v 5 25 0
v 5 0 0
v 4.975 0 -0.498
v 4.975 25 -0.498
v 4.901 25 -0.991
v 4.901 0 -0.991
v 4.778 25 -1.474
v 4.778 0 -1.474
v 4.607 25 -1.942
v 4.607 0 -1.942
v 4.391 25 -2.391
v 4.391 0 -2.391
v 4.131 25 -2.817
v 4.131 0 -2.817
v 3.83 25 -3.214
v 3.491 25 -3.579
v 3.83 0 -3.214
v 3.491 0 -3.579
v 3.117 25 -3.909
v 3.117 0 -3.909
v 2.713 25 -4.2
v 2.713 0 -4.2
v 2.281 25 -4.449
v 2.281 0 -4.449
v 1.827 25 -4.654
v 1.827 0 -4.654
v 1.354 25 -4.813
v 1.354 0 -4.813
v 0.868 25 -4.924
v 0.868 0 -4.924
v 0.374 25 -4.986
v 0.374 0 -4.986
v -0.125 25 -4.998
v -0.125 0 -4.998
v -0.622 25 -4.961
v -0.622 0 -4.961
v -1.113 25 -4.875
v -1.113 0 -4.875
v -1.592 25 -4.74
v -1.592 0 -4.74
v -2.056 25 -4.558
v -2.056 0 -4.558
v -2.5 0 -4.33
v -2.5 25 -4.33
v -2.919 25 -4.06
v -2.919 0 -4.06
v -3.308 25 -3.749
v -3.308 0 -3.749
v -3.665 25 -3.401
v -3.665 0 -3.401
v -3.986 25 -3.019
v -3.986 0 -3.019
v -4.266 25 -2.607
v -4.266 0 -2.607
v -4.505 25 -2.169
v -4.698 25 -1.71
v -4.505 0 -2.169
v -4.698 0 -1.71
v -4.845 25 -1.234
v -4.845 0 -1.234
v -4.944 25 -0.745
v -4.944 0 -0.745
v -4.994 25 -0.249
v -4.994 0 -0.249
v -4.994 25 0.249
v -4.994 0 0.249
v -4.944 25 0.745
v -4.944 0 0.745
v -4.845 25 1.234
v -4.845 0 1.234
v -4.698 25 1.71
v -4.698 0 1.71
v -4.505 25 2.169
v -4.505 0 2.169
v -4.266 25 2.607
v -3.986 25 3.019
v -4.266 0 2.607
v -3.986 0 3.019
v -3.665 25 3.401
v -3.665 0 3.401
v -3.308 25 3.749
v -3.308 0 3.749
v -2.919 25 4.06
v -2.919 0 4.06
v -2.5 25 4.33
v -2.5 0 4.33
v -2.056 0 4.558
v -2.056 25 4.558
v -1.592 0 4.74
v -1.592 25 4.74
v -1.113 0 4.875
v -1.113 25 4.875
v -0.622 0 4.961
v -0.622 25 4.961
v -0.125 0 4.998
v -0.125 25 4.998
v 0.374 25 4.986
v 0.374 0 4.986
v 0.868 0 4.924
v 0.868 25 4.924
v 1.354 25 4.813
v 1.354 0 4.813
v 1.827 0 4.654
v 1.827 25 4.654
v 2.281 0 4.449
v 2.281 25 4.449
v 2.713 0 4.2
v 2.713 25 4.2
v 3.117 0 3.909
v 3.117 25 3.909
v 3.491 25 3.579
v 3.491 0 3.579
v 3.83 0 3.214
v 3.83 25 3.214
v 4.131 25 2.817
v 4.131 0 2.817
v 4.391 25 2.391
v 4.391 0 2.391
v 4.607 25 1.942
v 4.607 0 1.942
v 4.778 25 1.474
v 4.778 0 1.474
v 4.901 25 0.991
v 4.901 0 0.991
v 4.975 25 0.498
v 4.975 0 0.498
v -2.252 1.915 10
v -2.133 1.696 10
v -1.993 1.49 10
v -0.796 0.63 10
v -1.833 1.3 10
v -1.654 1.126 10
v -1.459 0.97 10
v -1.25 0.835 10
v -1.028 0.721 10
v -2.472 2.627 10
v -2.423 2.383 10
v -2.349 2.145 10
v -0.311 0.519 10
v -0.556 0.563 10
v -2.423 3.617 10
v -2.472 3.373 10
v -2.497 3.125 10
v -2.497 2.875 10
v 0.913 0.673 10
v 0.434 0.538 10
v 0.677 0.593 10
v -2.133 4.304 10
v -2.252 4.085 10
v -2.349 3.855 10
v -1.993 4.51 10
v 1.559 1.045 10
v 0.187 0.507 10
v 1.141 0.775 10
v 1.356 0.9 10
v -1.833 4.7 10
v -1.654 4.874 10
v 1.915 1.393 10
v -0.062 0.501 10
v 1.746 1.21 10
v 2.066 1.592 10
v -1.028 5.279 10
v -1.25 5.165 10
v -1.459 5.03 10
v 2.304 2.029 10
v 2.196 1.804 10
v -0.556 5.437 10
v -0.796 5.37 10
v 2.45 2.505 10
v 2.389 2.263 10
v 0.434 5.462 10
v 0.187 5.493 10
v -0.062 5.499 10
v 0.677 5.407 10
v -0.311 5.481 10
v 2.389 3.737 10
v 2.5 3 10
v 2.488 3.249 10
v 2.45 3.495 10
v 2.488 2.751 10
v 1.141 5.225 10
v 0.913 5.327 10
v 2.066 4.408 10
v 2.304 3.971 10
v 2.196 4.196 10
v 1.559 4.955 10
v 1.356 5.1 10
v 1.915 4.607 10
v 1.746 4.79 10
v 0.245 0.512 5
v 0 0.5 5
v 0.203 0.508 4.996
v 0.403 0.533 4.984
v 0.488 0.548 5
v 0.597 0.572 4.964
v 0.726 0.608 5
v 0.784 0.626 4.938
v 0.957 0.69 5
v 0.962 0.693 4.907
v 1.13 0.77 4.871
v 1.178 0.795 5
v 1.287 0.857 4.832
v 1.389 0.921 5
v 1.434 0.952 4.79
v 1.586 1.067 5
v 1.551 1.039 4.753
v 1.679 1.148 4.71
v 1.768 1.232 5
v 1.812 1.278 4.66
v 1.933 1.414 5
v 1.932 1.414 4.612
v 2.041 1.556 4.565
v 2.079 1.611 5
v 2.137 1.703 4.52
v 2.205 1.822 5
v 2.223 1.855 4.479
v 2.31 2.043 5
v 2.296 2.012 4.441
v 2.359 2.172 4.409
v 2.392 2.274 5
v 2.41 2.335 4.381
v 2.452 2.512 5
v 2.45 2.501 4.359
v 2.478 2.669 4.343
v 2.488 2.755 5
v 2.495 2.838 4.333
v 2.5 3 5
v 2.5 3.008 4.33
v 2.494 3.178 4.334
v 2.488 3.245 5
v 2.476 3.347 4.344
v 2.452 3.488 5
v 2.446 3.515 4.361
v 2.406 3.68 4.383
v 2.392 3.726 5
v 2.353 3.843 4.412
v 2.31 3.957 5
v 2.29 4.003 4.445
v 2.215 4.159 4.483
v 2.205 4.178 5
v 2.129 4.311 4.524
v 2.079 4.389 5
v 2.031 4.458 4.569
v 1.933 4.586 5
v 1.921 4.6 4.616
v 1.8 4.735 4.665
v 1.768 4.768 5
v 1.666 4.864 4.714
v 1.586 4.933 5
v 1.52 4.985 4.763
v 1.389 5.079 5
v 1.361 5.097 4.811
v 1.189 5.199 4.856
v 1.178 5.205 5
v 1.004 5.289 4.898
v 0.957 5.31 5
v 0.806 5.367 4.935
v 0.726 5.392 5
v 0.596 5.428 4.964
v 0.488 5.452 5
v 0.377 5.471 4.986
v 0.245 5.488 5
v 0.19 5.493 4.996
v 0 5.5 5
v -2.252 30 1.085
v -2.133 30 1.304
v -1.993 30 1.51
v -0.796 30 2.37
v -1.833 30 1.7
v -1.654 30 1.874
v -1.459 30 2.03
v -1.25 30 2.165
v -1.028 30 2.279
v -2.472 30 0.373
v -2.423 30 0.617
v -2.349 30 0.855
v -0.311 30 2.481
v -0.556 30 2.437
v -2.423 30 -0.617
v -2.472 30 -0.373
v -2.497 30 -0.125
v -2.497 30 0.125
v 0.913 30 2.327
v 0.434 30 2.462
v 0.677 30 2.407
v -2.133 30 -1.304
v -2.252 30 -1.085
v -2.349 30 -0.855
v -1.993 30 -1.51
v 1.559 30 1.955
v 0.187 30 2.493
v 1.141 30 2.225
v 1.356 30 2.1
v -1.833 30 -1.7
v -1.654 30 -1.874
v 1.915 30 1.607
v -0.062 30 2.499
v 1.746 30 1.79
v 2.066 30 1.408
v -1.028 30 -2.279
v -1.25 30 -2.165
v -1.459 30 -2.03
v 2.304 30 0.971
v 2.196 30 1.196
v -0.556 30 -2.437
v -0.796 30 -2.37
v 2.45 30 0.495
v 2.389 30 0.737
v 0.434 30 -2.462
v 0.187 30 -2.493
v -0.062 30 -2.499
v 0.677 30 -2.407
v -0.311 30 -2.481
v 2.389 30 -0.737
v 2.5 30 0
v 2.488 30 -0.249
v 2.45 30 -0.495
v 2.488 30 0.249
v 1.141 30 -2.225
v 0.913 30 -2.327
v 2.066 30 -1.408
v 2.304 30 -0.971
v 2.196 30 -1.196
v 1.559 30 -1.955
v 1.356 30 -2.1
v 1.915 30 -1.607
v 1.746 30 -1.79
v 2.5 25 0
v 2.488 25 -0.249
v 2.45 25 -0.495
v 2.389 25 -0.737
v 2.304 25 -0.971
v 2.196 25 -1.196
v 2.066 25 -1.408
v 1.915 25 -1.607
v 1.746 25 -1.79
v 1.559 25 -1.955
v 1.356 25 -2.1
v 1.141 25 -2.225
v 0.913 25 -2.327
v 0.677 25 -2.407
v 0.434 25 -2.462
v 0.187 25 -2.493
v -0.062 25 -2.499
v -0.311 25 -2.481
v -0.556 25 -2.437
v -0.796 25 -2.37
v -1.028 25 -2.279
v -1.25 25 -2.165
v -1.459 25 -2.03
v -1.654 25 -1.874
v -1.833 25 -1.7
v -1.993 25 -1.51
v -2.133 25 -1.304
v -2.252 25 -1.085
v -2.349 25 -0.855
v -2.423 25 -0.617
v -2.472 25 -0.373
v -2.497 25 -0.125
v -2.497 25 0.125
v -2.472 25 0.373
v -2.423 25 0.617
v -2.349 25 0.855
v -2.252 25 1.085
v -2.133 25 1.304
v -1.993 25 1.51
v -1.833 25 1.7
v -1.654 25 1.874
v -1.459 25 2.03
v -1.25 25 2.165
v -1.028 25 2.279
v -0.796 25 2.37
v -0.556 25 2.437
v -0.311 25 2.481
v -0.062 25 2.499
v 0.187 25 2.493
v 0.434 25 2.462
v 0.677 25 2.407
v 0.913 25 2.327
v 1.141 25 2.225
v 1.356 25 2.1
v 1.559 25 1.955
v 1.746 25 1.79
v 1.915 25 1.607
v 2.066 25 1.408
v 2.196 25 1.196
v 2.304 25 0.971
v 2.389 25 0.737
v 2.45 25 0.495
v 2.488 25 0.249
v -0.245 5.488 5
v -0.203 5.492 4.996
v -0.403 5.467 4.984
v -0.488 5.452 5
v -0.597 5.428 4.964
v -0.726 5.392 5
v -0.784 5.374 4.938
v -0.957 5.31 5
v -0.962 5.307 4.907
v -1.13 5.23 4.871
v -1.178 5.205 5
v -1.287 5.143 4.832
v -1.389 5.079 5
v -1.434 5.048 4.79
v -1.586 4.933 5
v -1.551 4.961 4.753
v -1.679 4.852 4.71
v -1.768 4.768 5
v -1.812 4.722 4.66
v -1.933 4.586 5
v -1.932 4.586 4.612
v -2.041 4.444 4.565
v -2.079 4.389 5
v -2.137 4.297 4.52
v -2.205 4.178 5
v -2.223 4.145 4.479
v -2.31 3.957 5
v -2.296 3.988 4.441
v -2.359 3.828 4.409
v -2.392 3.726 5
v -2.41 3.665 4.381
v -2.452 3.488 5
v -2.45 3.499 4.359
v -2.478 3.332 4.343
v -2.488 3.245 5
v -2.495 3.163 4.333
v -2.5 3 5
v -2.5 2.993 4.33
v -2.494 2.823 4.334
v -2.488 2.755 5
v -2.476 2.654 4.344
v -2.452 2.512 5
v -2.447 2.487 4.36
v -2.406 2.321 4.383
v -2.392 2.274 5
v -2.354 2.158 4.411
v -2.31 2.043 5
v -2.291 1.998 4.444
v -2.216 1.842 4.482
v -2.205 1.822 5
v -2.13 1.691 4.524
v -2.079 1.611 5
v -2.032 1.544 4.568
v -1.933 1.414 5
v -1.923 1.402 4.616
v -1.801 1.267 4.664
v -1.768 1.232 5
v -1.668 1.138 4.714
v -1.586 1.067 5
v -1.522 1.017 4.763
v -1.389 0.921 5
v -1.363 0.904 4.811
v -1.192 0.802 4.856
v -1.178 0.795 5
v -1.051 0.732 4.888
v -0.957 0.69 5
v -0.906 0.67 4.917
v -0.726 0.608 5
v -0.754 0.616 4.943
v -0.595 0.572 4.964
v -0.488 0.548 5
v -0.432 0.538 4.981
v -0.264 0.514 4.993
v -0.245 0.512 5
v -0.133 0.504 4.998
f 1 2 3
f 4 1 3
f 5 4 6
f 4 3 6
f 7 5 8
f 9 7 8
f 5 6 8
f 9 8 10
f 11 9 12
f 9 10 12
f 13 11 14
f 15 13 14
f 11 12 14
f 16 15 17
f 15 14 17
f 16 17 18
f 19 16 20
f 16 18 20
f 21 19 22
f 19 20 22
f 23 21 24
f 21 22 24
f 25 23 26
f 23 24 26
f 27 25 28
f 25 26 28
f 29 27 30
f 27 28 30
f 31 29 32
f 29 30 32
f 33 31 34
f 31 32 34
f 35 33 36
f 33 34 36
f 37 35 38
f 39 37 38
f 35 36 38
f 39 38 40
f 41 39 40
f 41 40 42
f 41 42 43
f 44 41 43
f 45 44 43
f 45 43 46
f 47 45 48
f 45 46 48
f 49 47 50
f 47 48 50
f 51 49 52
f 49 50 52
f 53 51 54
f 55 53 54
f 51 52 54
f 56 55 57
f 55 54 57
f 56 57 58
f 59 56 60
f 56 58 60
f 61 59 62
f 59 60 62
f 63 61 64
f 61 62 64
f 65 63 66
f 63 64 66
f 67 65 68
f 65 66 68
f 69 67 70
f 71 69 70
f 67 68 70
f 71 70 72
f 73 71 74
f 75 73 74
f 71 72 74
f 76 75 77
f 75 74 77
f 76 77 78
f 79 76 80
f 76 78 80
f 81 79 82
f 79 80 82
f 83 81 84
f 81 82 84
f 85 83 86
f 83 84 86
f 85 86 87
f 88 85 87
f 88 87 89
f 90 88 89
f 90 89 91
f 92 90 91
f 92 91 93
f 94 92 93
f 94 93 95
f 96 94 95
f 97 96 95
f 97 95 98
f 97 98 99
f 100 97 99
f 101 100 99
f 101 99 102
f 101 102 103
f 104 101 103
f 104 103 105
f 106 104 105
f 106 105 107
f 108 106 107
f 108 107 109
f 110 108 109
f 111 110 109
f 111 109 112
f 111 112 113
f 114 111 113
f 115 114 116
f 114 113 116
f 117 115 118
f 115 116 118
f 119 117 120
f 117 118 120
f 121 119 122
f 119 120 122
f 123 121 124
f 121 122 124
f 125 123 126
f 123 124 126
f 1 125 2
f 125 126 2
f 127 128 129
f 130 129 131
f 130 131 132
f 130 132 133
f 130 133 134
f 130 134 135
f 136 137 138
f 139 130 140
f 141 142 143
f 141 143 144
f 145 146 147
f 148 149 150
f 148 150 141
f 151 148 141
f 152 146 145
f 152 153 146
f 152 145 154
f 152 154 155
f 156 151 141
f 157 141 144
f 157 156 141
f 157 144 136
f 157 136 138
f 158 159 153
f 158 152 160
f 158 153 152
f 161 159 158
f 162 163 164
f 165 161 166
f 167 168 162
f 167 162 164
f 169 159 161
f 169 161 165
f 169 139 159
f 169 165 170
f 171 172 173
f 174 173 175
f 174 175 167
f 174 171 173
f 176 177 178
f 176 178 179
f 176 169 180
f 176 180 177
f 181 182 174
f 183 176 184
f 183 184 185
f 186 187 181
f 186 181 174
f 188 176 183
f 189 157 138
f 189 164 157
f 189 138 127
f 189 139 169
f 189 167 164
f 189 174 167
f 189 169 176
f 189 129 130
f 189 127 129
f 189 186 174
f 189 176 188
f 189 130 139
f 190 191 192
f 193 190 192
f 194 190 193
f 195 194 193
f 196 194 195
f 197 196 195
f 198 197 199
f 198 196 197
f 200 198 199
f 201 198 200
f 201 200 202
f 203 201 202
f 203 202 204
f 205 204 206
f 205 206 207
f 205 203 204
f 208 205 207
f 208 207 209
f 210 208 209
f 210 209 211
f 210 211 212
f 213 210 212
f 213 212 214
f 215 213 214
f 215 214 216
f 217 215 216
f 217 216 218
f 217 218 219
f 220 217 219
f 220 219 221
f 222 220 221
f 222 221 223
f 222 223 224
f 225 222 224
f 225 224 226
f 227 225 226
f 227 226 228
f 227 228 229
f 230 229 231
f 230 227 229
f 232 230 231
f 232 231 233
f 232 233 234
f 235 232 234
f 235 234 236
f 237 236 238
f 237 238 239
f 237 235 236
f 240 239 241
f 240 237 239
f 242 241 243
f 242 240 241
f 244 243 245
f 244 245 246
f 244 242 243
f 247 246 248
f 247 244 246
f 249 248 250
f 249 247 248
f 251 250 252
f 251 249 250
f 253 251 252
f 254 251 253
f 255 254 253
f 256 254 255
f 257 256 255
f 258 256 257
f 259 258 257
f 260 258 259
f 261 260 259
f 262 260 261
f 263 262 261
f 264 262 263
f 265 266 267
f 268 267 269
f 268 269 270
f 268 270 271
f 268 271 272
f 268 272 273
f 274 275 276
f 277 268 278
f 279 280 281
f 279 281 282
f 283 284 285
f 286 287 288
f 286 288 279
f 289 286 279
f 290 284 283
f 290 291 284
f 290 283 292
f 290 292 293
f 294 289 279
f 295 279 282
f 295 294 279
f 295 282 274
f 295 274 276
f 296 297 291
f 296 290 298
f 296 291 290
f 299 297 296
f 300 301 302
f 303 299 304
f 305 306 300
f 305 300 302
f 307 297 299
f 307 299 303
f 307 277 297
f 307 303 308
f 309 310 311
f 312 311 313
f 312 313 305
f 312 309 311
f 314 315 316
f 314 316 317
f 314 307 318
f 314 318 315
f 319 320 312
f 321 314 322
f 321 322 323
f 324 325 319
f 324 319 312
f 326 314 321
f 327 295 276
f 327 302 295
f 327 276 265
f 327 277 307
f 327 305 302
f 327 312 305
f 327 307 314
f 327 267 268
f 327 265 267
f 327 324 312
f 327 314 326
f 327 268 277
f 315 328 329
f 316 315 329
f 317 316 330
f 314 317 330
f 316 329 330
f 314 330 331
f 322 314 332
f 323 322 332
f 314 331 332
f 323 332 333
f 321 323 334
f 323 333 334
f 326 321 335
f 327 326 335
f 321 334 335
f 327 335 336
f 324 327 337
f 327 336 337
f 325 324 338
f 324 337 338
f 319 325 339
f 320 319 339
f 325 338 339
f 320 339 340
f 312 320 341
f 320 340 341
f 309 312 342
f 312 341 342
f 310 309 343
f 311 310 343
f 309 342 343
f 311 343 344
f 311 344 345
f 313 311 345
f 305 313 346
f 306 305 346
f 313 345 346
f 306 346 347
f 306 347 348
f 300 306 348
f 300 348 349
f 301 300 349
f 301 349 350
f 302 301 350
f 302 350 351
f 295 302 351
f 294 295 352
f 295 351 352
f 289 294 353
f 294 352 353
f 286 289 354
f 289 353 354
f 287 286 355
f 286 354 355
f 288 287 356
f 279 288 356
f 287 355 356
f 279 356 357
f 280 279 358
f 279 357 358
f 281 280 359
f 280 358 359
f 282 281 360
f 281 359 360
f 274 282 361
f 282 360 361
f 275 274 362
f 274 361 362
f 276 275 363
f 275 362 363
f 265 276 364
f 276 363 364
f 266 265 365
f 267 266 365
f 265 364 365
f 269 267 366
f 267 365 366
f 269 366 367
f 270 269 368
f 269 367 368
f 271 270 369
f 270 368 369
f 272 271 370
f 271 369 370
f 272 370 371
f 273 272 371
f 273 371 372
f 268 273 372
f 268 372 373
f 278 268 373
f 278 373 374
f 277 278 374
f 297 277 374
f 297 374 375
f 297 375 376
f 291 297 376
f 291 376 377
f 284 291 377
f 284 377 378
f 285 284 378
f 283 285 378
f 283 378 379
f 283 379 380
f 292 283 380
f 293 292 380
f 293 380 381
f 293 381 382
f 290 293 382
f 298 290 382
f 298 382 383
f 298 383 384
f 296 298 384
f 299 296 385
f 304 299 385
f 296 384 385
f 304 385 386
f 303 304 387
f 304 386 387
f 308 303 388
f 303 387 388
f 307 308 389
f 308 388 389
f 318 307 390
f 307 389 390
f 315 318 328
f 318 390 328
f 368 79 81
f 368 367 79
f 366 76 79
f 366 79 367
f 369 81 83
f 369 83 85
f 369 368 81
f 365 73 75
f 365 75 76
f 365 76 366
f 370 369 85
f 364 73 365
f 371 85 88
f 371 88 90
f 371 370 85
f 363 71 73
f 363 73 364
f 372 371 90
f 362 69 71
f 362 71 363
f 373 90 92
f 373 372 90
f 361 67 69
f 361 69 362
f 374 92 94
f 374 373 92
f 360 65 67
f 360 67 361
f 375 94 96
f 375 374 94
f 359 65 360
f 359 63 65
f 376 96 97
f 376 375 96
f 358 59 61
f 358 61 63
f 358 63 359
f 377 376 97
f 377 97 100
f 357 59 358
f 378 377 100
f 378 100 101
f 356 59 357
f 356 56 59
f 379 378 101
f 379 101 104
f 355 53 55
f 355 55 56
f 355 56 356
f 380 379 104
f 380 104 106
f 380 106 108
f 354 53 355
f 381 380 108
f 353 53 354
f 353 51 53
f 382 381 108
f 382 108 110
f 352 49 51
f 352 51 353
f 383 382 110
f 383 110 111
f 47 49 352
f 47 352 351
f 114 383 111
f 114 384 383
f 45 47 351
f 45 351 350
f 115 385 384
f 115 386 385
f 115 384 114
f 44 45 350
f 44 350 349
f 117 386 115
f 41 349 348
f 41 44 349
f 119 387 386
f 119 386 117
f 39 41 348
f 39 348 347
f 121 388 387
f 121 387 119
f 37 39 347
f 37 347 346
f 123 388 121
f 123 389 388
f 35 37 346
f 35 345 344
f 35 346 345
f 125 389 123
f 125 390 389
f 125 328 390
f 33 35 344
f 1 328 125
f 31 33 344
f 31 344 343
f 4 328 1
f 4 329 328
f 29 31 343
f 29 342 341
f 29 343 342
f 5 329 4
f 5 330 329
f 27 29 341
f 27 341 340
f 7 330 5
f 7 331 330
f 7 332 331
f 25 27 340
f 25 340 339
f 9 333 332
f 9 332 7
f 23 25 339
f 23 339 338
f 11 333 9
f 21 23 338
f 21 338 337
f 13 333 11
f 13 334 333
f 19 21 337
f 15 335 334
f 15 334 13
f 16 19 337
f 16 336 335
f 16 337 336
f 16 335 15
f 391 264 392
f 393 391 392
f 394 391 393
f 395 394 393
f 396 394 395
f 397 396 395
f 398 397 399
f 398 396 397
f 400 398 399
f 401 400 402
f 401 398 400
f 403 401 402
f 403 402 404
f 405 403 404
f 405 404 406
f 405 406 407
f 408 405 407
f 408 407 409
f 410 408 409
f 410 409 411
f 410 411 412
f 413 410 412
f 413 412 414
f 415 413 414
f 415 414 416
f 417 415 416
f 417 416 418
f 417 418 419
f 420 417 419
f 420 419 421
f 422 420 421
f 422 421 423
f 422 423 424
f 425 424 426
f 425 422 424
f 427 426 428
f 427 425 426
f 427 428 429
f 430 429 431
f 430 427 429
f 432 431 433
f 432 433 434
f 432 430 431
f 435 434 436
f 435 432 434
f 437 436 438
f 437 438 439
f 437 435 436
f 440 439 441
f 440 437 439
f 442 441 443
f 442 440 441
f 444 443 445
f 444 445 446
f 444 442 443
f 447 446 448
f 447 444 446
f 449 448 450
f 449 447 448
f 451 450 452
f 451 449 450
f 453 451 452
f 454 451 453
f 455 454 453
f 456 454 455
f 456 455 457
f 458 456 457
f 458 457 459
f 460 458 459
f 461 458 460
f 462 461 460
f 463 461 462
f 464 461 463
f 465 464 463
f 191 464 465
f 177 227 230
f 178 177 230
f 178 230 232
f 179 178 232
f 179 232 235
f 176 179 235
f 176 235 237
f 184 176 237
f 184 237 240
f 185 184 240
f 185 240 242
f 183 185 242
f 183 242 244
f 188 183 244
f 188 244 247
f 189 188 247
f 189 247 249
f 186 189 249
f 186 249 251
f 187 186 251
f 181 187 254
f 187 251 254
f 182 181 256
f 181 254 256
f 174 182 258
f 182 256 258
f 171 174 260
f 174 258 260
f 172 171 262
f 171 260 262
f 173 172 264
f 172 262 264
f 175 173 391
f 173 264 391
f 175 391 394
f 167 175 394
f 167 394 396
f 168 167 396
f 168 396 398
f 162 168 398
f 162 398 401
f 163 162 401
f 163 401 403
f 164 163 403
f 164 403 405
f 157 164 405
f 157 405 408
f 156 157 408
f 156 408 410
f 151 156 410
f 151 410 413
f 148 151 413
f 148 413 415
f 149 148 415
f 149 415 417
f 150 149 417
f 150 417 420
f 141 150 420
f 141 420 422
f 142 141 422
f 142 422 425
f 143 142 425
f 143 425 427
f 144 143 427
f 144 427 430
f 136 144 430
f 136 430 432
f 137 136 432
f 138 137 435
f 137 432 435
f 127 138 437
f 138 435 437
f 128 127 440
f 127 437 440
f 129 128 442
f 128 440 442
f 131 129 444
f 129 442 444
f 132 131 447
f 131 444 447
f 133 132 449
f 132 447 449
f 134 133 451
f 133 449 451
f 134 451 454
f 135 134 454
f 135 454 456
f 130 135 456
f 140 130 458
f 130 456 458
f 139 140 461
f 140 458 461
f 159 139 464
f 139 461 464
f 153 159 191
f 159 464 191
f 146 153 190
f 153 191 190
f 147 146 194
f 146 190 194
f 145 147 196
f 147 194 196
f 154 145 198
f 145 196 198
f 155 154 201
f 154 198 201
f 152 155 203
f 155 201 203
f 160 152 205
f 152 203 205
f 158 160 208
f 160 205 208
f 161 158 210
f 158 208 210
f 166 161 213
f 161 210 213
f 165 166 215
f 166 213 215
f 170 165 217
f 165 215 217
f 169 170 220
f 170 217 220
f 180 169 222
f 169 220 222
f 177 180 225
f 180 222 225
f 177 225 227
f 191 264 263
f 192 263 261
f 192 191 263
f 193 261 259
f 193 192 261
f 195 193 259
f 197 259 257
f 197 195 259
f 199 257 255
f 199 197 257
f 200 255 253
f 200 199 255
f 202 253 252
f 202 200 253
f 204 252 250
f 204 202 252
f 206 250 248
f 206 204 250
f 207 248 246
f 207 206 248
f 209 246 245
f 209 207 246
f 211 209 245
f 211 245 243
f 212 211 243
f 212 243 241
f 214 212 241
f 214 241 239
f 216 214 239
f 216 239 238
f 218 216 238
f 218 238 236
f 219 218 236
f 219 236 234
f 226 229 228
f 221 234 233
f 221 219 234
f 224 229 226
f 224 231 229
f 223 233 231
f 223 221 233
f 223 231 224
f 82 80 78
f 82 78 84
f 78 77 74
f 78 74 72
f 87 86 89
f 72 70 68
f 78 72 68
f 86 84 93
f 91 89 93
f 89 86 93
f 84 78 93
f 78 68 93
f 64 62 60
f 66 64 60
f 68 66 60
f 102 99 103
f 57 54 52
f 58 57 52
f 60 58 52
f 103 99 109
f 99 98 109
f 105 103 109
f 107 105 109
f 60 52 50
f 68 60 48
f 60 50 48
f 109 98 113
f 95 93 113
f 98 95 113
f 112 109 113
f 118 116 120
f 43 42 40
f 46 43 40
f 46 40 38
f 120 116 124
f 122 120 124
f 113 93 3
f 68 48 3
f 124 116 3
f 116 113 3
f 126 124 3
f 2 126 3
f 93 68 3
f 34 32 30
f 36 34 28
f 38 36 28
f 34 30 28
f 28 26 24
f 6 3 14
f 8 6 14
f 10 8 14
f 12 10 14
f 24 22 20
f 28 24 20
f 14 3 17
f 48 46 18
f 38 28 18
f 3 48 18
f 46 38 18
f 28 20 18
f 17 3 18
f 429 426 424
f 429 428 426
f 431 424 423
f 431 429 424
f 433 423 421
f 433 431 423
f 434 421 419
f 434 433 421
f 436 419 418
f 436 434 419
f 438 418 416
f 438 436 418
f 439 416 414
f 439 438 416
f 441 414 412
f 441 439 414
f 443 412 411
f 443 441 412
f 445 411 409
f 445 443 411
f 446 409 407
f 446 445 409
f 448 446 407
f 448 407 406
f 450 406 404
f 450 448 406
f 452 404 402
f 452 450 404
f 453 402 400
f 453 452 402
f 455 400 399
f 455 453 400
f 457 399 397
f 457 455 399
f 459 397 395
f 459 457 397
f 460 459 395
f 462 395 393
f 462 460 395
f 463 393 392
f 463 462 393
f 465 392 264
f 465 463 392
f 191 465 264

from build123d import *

# Parameters (mm, degrees)
SKETCH1_R                       = 5
BOSS_EXTRUDE1_DEPTH             = 25
SKETCH2_R                       = 2.5
BOSS_EXTRUDE2_DEPTH             = 5
BOSS_EXTRUDE2_DIRECTION_2_REACH = 12
SKETCH4_R                       = 2.5
BOSS_EXTRUDE3_DEPTH             = 5


with BuildPart() as part:
    # Sketch1 → Boss-Extrude1 (new body)
    with BuildSketch(Plane(origin=(0, 0, 0), x_dir=(1, 0, 0), z_dir=(0, 1, 0))):
        Circle(SKETCH1_R)
    extrude(amount=BOSS_EXTRUDE1_DEPTH)


with BuildPart() as body_2:
    # Sketch2 → Boss-Extrude2 (new body)
    with BuildSketch(Plane.XY.offset(5)):
        with Locations((0, 3)):
            Circle(SKETCH2_R)
    extrude(amount=BOSS_EXTRUDE2_DEPTH)


    # Sketch2 → Boss-Extrude2 direction 2 (add, up to next)
    with BuildSketch(Plane.XY.offset(5), mode=Mode.PRIVATE) as boss_extrude2_direction_2_sk1:
        with Locations((0, 3)):
            Circle(SKETCH2_R)
    boss_extrude2_direction_2_tool1 = extrude(boss_extrude2_direction_2_sk1.sketch, amount=-BOSS_EXTRUDE2_DIRECTION_2_REACH, mode=Mode.PRIVATE) - part.part
    add(boss_extrude2_direction_2_tool1.solids().sort_by_distance((0, 3, 5))[0])
    add(boss_extrude2_direction_2_tool1.solids().sort_by_distance((0, 3, 5))[1])


with BuildPart() as part_1:
    add(part.part)

    # Sketch4 → Boss-Extrude3 (add)
    with BuildSketch(Plane(origin=(0, 25, 0), x_dir=(1, 0, 0), z_dir=(0, 1, 0))):
        Circle(SKETCH4_R)
    extrude(amount=BOSS_EXTRUDE3_DEPTH)


solid = Compound([body_2.part, part_1.part])
